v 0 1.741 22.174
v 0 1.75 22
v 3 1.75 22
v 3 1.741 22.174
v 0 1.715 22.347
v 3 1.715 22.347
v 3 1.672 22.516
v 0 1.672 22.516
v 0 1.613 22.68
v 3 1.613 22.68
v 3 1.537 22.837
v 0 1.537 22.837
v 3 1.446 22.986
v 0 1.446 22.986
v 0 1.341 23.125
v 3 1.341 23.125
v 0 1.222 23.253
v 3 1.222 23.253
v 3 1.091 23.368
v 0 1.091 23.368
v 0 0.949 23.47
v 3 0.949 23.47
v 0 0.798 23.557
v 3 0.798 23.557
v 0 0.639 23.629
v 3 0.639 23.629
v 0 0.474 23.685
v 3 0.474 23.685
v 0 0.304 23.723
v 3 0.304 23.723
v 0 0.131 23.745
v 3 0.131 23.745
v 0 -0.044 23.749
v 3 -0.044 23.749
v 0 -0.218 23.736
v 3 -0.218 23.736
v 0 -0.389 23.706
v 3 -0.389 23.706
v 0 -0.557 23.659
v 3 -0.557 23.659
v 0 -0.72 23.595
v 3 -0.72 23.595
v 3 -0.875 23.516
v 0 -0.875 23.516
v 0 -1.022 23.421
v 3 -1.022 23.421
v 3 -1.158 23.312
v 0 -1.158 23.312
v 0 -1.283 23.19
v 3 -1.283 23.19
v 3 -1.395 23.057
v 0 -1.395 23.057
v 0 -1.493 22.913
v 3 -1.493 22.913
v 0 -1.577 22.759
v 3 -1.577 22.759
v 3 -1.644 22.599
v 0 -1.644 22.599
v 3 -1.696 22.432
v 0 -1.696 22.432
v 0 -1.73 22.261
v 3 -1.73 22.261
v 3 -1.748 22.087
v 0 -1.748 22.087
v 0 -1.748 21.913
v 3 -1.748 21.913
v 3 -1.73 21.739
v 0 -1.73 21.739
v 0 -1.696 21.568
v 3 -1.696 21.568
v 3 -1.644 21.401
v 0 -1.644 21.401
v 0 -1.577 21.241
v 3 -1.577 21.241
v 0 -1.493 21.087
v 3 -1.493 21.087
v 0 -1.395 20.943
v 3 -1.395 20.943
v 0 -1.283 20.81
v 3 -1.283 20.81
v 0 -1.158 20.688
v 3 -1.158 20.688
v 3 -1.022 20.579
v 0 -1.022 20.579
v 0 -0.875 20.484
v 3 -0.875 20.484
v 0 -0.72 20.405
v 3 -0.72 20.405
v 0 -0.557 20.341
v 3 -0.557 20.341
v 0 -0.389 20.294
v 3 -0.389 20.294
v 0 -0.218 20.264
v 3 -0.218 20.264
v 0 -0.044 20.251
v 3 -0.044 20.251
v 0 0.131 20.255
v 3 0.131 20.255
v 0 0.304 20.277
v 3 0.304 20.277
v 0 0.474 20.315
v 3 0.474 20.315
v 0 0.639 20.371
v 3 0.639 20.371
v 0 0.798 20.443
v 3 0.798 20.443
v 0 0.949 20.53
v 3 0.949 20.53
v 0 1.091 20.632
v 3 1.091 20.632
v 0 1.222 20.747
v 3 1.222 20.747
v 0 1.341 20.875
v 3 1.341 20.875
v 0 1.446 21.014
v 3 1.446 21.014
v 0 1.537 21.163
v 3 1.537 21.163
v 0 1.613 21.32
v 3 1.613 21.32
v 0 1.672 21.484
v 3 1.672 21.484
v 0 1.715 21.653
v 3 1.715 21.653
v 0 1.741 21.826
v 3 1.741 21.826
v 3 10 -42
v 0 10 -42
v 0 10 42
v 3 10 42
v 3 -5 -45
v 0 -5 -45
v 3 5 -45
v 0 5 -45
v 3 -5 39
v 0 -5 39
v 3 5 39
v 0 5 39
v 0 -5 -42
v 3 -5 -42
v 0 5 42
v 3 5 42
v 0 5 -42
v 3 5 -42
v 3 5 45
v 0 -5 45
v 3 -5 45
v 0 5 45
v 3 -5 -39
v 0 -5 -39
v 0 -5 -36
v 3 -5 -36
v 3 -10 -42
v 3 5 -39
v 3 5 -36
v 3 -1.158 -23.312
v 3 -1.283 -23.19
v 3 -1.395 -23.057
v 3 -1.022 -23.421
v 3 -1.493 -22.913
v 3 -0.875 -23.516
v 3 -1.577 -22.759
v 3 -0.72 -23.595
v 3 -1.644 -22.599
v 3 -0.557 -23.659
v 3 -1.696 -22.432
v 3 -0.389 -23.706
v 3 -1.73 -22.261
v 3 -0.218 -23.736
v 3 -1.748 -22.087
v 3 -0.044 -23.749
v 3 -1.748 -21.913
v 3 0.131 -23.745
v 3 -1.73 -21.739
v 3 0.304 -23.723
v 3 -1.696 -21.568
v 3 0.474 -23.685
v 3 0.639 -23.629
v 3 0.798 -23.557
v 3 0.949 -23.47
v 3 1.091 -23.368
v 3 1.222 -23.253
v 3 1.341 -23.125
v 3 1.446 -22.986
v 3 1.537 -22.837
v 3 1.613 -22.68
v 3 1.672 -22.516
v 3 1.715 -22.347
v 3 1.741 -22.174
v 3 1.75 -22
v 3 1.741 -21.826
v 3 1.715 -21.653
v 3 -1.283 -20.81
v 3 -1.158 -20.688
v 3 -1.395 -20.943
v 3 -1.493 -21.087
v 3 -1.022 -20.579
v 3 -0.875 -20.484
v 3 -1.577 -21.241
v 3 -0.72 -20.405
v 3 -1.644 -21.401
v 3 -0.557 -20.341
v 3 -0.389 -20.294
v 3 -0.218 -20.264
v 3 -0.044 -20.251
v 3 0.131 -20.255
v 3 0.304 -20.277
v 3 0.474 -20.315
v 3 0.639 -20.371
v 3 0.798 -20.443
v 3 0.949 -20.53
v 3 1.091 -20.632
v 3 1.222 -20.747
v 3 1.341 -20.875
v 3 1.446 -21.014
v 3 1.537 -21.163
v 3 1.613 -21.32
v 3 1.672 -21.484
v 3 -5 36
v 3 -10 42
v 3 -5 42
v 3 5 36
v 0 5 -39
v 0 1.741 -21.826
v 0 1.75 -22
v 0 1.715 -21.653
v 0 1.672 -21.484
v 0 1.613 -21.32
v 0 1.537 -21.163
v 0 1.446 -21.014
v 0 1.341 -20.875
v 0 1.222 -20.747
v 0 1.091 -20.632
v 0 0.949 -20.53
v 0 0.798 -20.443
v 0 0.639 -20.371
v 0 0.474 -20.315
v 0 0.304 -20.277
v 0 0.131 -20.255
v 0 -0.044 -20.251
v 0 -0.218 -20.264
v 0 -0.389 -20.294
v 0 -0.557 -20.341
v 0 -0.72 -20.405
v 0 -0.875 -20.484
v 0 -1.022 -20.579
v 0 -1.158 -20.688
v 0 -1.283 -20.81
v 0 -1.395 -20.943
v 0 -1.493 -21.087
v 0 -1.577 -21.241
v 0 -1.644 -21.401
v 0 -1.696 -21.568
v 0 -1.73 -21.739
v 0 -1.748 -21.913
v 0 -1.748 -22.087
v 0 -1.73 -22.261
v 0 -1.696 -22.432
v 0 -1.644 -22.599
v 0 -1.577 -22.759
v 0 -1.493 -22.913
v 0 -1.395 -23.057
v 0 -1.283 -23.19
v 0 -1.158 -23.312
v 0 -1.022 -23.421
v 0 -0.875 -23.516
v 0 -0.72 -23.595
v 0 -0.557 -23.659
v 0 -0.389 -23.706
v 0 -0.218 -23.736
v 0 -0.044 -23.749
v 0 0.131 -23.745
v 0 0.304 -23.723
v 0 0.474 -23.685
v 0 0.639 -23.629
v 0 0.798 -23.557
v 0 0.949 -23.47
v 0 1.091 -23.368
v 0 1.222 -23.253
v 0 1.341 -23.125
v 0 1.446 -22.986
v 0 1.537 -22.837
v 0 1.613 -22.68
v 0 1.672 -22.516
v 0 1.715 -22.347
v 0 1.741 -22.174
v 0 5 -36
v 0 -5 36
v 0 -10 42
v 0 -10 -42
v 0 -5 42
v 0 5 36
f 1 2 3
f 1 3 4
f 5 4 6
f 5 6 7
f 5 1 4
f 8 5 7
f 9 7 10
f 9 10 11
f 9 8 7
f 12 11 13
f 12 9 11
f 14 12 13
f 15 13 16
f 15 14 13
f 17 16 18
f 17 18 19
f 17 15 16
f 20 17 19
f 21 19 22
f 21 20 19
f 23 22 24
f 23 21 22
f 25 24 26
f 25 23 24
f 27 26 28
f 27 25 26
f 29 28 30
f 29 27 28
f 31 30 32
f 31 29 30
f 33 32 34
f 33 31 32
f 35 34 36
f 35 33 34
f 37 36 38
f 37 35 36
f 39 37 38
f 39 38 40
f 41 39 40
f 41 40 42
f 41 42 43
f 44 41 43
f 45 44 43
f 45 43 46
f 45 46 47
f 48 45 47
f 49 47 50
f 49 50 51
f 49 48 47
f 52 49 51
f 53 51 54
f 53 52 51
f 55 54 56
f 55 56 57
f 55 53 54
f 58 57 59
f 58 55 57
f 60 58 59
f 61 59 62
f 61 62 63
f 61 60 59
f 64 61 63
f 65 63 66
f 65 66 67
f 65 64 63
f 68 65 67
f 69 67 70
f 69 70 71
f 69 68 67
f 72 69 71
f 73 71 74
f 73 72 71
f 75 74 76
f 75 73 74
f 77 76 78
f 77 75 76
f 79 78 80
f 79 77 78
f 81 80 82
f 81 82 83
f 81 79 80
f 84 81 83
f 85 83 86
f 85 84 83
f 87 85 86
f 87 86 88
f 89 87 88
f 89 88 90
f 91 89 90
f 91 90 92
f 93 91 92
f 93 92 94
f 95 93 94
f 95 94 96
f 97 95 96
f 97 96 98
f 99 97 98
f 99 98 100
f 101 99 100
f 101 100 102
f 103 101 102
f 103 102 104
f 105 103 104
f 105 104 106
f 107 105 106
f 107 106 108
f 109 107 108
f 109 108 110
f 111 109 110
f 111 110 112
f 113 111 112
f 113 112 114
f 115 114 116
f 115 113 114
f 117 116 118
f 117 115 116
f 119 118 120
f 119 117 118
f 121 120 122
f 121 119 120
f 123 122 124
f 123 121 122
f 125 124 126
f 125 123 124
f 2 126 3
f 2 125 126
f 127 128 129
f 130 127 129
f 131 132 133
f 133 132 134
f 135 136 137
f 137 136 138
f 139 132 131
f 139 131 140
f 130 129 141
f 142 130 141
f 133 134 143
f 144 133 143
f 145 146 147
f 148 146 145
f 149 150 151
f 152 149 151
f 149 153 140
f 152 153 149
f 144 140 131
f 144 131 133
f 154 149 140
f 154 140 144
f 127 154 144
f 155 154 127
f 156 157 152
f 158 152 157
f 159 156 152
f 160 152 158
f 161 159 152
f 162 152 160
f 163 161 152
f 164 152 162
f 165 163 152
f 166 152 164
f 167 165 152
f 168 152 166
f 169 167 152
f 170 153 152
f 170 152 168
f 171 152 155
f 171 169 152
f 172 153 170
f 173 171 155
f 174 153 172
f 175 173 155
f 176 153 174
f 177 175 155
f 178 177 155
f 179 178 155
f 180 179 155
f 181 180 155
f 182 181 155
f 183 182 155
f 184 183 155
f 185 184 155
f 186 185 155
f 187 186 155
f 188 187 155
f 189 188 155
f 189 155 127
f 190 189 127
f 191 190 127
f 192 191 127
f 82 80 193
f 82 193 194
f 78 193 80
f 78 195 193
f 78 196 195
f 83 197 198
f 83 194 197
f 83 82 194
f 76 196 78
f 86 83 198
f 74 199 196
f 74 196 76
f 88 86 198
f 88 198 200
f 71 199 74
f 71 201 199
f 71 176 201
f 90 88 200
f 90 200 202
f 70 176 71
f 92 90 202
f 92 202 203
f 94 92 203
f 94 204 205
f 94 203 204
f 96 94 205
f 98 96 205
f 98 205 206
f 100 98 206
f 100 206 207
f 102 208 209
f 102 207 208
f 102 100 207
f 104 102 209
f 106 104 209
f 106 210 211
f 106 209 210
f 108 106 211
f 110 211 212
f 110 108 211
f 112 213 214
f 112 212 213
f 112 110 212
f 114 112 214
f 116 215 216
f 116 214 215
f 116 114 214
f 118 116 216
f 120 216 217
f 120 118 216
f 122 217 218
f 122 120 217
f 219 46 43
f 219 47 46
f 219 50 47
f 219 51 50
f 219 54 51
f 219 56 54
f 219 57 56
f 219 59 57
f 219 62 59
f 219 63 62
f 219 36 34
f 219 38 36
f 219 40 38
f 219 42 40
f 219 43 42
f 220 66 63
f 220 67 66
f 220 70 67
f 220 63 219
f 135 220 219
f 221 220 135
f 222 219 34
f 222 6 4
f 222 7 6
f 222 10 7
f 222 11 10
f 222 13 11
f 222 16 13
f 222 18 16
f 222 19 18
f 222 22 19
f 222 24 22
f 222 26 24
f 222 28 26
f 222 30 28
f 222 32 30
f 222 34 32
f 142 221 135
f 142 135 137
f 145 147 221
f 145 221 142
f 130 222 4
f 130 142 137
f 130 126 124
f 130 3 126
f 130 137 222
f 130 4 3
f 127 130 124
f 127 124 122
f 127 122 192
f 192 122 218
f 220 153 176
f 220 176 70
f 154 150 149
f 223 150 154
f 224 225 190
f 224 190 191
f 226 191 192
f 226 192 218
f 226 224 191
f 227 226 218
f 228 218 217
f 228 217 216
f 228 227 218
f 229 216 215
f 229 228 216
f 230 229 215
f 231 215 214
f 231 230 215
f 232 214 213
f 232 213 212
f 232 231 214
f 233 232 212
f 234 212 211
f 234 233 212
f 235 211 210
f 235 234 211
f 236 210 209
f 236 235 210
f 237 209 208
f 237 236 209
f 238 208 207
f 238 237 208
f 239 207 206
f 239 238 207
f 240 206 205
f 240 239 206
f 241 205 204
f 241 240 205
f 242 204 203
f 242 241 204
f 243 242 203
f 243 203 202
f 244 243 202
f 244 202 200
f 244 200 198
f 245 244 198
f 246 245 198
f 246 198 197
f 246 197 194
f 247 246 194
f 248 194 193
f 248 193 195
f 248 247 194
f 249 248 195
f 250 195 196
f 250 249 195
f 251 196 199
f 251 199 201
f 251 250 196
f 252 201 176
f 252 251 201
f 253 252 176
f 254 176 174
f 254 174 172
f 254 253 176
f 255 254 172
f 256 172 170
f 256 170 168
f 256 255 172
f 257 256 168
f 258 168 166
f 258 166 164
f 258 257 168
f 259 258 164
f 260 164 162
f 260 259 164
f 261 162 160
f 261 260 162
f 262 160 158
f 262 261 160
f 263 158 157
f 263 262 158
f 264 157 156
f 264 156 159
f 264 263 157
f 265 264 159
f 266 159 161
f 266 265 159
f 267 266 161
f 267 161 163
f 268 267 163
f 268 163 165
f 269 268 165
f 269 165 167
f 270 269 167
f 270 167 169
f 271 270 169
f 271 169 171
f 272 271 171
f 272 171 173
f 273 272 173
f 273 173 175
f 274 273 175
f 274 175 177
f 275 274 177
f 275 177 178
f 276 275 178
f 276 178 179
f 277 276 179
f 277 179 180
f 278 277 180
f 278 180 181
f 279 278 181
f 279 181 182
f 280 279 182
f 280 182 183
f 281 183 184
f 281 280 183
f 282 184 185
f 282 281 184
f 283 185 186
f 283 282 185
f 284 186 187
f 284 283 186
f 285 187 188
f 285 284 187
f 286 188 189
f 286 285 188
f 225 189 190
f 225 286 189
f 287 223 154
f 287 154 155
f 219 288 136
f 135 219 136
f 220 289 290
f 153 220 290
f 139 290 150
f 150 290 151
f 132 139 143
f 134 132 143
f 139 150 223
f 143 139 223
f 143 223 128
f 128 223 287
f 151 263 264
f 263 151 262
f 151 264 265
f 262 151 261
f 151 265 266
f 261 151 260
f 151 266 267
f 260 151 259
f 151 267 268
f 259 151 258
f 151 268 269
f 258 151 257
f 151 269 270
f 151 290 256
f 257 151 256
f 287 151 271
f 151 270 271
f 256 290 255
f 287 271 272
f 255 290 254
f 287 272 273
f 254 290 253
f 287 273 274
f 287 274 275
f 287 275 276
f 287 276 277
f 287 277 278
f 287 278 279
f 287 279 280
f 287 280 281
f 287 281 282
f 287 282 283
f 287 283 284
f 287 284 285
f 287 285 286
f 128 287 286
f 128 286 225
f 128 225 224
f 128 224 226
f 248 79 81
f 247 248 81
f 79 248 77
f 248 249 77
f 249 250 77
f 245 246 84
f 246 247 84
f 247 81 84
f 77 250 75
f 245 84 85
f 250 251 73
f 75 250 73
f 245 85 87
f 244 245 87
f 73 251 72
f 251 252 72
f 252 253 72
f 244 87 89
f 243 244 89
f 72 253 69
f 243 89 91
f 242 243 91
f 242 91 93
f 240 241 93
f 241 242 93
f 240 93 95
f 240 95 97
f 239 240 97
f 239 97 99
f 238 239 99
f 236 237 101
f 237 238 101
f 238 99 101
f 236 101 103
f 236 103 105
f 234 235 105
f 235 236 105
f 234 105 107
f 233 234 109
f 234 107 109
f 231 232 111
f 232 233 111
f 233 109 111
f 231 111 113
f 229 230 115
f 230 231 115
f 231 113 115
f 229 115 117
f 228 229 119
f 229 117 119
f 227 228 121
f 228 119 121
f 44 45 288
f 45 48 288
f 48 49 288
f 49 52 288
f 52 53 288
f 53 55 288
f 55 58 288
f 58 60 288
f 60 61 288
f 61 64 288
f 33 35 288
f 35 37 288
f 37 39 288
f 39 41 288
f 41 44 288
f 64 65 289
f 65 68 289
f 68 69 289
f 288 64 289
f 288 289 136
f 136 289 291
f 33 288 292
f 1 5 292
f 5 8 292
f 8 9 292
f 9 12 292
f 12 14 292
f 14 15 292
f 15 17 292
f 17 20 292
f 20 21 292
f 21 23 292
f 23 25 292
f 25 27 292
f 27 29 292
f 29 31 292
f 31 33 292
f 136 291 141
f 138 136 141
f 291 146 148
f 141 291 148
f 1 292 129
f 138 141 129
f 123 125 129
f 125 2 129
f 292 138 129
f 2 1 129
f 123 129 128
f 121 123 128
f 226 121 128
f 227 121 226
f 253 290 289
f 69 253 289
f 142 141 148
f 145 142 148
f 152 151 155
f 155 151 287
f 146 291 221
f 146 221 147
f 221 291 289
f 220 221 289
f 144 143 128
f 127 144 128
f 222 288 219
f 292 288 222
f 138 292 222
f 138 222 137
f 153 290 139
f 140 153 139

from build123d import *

# Parameters (mm, degrees)
F0_W     = 10
F0_H     = 3
F0_R     = 1.75
F1_DEPTH = 3


with BuildPart() as f1:
    # F0 (on Right) → F1 (new body)
    with BuildSketch(Plane.YZ):
        Polygon((10, -42), (10, 42), (5, 42), (-5, 42), (-10, 42), (-10, -42), (-5, -42), (5, -42), align=None)
        with Locations((0, -37.5)):
            Rectangle(F0_W, F0_H, mode=Mode.SUBTRACT)
        with Locations((0, -22)):
            Circle(F0_R, mode=Mode.SUBTRACT)
        with Locations((0, 22)):
            Circle(F0_R, mode=Mode.SUBTRACT)
        with Locations((0, 37.5)):
            Rectangle(F0_W, F0_H, mode=Mode.SUBTRACT)
        with Locations((0, 43.5)):
            Rectangle(F0_W, F0_H)
        with Locations((0, -43.5)):
            Rectangle(F0_W, F0_H)
    extrude(amount=F1_DEPTH)


solid = f1.part
